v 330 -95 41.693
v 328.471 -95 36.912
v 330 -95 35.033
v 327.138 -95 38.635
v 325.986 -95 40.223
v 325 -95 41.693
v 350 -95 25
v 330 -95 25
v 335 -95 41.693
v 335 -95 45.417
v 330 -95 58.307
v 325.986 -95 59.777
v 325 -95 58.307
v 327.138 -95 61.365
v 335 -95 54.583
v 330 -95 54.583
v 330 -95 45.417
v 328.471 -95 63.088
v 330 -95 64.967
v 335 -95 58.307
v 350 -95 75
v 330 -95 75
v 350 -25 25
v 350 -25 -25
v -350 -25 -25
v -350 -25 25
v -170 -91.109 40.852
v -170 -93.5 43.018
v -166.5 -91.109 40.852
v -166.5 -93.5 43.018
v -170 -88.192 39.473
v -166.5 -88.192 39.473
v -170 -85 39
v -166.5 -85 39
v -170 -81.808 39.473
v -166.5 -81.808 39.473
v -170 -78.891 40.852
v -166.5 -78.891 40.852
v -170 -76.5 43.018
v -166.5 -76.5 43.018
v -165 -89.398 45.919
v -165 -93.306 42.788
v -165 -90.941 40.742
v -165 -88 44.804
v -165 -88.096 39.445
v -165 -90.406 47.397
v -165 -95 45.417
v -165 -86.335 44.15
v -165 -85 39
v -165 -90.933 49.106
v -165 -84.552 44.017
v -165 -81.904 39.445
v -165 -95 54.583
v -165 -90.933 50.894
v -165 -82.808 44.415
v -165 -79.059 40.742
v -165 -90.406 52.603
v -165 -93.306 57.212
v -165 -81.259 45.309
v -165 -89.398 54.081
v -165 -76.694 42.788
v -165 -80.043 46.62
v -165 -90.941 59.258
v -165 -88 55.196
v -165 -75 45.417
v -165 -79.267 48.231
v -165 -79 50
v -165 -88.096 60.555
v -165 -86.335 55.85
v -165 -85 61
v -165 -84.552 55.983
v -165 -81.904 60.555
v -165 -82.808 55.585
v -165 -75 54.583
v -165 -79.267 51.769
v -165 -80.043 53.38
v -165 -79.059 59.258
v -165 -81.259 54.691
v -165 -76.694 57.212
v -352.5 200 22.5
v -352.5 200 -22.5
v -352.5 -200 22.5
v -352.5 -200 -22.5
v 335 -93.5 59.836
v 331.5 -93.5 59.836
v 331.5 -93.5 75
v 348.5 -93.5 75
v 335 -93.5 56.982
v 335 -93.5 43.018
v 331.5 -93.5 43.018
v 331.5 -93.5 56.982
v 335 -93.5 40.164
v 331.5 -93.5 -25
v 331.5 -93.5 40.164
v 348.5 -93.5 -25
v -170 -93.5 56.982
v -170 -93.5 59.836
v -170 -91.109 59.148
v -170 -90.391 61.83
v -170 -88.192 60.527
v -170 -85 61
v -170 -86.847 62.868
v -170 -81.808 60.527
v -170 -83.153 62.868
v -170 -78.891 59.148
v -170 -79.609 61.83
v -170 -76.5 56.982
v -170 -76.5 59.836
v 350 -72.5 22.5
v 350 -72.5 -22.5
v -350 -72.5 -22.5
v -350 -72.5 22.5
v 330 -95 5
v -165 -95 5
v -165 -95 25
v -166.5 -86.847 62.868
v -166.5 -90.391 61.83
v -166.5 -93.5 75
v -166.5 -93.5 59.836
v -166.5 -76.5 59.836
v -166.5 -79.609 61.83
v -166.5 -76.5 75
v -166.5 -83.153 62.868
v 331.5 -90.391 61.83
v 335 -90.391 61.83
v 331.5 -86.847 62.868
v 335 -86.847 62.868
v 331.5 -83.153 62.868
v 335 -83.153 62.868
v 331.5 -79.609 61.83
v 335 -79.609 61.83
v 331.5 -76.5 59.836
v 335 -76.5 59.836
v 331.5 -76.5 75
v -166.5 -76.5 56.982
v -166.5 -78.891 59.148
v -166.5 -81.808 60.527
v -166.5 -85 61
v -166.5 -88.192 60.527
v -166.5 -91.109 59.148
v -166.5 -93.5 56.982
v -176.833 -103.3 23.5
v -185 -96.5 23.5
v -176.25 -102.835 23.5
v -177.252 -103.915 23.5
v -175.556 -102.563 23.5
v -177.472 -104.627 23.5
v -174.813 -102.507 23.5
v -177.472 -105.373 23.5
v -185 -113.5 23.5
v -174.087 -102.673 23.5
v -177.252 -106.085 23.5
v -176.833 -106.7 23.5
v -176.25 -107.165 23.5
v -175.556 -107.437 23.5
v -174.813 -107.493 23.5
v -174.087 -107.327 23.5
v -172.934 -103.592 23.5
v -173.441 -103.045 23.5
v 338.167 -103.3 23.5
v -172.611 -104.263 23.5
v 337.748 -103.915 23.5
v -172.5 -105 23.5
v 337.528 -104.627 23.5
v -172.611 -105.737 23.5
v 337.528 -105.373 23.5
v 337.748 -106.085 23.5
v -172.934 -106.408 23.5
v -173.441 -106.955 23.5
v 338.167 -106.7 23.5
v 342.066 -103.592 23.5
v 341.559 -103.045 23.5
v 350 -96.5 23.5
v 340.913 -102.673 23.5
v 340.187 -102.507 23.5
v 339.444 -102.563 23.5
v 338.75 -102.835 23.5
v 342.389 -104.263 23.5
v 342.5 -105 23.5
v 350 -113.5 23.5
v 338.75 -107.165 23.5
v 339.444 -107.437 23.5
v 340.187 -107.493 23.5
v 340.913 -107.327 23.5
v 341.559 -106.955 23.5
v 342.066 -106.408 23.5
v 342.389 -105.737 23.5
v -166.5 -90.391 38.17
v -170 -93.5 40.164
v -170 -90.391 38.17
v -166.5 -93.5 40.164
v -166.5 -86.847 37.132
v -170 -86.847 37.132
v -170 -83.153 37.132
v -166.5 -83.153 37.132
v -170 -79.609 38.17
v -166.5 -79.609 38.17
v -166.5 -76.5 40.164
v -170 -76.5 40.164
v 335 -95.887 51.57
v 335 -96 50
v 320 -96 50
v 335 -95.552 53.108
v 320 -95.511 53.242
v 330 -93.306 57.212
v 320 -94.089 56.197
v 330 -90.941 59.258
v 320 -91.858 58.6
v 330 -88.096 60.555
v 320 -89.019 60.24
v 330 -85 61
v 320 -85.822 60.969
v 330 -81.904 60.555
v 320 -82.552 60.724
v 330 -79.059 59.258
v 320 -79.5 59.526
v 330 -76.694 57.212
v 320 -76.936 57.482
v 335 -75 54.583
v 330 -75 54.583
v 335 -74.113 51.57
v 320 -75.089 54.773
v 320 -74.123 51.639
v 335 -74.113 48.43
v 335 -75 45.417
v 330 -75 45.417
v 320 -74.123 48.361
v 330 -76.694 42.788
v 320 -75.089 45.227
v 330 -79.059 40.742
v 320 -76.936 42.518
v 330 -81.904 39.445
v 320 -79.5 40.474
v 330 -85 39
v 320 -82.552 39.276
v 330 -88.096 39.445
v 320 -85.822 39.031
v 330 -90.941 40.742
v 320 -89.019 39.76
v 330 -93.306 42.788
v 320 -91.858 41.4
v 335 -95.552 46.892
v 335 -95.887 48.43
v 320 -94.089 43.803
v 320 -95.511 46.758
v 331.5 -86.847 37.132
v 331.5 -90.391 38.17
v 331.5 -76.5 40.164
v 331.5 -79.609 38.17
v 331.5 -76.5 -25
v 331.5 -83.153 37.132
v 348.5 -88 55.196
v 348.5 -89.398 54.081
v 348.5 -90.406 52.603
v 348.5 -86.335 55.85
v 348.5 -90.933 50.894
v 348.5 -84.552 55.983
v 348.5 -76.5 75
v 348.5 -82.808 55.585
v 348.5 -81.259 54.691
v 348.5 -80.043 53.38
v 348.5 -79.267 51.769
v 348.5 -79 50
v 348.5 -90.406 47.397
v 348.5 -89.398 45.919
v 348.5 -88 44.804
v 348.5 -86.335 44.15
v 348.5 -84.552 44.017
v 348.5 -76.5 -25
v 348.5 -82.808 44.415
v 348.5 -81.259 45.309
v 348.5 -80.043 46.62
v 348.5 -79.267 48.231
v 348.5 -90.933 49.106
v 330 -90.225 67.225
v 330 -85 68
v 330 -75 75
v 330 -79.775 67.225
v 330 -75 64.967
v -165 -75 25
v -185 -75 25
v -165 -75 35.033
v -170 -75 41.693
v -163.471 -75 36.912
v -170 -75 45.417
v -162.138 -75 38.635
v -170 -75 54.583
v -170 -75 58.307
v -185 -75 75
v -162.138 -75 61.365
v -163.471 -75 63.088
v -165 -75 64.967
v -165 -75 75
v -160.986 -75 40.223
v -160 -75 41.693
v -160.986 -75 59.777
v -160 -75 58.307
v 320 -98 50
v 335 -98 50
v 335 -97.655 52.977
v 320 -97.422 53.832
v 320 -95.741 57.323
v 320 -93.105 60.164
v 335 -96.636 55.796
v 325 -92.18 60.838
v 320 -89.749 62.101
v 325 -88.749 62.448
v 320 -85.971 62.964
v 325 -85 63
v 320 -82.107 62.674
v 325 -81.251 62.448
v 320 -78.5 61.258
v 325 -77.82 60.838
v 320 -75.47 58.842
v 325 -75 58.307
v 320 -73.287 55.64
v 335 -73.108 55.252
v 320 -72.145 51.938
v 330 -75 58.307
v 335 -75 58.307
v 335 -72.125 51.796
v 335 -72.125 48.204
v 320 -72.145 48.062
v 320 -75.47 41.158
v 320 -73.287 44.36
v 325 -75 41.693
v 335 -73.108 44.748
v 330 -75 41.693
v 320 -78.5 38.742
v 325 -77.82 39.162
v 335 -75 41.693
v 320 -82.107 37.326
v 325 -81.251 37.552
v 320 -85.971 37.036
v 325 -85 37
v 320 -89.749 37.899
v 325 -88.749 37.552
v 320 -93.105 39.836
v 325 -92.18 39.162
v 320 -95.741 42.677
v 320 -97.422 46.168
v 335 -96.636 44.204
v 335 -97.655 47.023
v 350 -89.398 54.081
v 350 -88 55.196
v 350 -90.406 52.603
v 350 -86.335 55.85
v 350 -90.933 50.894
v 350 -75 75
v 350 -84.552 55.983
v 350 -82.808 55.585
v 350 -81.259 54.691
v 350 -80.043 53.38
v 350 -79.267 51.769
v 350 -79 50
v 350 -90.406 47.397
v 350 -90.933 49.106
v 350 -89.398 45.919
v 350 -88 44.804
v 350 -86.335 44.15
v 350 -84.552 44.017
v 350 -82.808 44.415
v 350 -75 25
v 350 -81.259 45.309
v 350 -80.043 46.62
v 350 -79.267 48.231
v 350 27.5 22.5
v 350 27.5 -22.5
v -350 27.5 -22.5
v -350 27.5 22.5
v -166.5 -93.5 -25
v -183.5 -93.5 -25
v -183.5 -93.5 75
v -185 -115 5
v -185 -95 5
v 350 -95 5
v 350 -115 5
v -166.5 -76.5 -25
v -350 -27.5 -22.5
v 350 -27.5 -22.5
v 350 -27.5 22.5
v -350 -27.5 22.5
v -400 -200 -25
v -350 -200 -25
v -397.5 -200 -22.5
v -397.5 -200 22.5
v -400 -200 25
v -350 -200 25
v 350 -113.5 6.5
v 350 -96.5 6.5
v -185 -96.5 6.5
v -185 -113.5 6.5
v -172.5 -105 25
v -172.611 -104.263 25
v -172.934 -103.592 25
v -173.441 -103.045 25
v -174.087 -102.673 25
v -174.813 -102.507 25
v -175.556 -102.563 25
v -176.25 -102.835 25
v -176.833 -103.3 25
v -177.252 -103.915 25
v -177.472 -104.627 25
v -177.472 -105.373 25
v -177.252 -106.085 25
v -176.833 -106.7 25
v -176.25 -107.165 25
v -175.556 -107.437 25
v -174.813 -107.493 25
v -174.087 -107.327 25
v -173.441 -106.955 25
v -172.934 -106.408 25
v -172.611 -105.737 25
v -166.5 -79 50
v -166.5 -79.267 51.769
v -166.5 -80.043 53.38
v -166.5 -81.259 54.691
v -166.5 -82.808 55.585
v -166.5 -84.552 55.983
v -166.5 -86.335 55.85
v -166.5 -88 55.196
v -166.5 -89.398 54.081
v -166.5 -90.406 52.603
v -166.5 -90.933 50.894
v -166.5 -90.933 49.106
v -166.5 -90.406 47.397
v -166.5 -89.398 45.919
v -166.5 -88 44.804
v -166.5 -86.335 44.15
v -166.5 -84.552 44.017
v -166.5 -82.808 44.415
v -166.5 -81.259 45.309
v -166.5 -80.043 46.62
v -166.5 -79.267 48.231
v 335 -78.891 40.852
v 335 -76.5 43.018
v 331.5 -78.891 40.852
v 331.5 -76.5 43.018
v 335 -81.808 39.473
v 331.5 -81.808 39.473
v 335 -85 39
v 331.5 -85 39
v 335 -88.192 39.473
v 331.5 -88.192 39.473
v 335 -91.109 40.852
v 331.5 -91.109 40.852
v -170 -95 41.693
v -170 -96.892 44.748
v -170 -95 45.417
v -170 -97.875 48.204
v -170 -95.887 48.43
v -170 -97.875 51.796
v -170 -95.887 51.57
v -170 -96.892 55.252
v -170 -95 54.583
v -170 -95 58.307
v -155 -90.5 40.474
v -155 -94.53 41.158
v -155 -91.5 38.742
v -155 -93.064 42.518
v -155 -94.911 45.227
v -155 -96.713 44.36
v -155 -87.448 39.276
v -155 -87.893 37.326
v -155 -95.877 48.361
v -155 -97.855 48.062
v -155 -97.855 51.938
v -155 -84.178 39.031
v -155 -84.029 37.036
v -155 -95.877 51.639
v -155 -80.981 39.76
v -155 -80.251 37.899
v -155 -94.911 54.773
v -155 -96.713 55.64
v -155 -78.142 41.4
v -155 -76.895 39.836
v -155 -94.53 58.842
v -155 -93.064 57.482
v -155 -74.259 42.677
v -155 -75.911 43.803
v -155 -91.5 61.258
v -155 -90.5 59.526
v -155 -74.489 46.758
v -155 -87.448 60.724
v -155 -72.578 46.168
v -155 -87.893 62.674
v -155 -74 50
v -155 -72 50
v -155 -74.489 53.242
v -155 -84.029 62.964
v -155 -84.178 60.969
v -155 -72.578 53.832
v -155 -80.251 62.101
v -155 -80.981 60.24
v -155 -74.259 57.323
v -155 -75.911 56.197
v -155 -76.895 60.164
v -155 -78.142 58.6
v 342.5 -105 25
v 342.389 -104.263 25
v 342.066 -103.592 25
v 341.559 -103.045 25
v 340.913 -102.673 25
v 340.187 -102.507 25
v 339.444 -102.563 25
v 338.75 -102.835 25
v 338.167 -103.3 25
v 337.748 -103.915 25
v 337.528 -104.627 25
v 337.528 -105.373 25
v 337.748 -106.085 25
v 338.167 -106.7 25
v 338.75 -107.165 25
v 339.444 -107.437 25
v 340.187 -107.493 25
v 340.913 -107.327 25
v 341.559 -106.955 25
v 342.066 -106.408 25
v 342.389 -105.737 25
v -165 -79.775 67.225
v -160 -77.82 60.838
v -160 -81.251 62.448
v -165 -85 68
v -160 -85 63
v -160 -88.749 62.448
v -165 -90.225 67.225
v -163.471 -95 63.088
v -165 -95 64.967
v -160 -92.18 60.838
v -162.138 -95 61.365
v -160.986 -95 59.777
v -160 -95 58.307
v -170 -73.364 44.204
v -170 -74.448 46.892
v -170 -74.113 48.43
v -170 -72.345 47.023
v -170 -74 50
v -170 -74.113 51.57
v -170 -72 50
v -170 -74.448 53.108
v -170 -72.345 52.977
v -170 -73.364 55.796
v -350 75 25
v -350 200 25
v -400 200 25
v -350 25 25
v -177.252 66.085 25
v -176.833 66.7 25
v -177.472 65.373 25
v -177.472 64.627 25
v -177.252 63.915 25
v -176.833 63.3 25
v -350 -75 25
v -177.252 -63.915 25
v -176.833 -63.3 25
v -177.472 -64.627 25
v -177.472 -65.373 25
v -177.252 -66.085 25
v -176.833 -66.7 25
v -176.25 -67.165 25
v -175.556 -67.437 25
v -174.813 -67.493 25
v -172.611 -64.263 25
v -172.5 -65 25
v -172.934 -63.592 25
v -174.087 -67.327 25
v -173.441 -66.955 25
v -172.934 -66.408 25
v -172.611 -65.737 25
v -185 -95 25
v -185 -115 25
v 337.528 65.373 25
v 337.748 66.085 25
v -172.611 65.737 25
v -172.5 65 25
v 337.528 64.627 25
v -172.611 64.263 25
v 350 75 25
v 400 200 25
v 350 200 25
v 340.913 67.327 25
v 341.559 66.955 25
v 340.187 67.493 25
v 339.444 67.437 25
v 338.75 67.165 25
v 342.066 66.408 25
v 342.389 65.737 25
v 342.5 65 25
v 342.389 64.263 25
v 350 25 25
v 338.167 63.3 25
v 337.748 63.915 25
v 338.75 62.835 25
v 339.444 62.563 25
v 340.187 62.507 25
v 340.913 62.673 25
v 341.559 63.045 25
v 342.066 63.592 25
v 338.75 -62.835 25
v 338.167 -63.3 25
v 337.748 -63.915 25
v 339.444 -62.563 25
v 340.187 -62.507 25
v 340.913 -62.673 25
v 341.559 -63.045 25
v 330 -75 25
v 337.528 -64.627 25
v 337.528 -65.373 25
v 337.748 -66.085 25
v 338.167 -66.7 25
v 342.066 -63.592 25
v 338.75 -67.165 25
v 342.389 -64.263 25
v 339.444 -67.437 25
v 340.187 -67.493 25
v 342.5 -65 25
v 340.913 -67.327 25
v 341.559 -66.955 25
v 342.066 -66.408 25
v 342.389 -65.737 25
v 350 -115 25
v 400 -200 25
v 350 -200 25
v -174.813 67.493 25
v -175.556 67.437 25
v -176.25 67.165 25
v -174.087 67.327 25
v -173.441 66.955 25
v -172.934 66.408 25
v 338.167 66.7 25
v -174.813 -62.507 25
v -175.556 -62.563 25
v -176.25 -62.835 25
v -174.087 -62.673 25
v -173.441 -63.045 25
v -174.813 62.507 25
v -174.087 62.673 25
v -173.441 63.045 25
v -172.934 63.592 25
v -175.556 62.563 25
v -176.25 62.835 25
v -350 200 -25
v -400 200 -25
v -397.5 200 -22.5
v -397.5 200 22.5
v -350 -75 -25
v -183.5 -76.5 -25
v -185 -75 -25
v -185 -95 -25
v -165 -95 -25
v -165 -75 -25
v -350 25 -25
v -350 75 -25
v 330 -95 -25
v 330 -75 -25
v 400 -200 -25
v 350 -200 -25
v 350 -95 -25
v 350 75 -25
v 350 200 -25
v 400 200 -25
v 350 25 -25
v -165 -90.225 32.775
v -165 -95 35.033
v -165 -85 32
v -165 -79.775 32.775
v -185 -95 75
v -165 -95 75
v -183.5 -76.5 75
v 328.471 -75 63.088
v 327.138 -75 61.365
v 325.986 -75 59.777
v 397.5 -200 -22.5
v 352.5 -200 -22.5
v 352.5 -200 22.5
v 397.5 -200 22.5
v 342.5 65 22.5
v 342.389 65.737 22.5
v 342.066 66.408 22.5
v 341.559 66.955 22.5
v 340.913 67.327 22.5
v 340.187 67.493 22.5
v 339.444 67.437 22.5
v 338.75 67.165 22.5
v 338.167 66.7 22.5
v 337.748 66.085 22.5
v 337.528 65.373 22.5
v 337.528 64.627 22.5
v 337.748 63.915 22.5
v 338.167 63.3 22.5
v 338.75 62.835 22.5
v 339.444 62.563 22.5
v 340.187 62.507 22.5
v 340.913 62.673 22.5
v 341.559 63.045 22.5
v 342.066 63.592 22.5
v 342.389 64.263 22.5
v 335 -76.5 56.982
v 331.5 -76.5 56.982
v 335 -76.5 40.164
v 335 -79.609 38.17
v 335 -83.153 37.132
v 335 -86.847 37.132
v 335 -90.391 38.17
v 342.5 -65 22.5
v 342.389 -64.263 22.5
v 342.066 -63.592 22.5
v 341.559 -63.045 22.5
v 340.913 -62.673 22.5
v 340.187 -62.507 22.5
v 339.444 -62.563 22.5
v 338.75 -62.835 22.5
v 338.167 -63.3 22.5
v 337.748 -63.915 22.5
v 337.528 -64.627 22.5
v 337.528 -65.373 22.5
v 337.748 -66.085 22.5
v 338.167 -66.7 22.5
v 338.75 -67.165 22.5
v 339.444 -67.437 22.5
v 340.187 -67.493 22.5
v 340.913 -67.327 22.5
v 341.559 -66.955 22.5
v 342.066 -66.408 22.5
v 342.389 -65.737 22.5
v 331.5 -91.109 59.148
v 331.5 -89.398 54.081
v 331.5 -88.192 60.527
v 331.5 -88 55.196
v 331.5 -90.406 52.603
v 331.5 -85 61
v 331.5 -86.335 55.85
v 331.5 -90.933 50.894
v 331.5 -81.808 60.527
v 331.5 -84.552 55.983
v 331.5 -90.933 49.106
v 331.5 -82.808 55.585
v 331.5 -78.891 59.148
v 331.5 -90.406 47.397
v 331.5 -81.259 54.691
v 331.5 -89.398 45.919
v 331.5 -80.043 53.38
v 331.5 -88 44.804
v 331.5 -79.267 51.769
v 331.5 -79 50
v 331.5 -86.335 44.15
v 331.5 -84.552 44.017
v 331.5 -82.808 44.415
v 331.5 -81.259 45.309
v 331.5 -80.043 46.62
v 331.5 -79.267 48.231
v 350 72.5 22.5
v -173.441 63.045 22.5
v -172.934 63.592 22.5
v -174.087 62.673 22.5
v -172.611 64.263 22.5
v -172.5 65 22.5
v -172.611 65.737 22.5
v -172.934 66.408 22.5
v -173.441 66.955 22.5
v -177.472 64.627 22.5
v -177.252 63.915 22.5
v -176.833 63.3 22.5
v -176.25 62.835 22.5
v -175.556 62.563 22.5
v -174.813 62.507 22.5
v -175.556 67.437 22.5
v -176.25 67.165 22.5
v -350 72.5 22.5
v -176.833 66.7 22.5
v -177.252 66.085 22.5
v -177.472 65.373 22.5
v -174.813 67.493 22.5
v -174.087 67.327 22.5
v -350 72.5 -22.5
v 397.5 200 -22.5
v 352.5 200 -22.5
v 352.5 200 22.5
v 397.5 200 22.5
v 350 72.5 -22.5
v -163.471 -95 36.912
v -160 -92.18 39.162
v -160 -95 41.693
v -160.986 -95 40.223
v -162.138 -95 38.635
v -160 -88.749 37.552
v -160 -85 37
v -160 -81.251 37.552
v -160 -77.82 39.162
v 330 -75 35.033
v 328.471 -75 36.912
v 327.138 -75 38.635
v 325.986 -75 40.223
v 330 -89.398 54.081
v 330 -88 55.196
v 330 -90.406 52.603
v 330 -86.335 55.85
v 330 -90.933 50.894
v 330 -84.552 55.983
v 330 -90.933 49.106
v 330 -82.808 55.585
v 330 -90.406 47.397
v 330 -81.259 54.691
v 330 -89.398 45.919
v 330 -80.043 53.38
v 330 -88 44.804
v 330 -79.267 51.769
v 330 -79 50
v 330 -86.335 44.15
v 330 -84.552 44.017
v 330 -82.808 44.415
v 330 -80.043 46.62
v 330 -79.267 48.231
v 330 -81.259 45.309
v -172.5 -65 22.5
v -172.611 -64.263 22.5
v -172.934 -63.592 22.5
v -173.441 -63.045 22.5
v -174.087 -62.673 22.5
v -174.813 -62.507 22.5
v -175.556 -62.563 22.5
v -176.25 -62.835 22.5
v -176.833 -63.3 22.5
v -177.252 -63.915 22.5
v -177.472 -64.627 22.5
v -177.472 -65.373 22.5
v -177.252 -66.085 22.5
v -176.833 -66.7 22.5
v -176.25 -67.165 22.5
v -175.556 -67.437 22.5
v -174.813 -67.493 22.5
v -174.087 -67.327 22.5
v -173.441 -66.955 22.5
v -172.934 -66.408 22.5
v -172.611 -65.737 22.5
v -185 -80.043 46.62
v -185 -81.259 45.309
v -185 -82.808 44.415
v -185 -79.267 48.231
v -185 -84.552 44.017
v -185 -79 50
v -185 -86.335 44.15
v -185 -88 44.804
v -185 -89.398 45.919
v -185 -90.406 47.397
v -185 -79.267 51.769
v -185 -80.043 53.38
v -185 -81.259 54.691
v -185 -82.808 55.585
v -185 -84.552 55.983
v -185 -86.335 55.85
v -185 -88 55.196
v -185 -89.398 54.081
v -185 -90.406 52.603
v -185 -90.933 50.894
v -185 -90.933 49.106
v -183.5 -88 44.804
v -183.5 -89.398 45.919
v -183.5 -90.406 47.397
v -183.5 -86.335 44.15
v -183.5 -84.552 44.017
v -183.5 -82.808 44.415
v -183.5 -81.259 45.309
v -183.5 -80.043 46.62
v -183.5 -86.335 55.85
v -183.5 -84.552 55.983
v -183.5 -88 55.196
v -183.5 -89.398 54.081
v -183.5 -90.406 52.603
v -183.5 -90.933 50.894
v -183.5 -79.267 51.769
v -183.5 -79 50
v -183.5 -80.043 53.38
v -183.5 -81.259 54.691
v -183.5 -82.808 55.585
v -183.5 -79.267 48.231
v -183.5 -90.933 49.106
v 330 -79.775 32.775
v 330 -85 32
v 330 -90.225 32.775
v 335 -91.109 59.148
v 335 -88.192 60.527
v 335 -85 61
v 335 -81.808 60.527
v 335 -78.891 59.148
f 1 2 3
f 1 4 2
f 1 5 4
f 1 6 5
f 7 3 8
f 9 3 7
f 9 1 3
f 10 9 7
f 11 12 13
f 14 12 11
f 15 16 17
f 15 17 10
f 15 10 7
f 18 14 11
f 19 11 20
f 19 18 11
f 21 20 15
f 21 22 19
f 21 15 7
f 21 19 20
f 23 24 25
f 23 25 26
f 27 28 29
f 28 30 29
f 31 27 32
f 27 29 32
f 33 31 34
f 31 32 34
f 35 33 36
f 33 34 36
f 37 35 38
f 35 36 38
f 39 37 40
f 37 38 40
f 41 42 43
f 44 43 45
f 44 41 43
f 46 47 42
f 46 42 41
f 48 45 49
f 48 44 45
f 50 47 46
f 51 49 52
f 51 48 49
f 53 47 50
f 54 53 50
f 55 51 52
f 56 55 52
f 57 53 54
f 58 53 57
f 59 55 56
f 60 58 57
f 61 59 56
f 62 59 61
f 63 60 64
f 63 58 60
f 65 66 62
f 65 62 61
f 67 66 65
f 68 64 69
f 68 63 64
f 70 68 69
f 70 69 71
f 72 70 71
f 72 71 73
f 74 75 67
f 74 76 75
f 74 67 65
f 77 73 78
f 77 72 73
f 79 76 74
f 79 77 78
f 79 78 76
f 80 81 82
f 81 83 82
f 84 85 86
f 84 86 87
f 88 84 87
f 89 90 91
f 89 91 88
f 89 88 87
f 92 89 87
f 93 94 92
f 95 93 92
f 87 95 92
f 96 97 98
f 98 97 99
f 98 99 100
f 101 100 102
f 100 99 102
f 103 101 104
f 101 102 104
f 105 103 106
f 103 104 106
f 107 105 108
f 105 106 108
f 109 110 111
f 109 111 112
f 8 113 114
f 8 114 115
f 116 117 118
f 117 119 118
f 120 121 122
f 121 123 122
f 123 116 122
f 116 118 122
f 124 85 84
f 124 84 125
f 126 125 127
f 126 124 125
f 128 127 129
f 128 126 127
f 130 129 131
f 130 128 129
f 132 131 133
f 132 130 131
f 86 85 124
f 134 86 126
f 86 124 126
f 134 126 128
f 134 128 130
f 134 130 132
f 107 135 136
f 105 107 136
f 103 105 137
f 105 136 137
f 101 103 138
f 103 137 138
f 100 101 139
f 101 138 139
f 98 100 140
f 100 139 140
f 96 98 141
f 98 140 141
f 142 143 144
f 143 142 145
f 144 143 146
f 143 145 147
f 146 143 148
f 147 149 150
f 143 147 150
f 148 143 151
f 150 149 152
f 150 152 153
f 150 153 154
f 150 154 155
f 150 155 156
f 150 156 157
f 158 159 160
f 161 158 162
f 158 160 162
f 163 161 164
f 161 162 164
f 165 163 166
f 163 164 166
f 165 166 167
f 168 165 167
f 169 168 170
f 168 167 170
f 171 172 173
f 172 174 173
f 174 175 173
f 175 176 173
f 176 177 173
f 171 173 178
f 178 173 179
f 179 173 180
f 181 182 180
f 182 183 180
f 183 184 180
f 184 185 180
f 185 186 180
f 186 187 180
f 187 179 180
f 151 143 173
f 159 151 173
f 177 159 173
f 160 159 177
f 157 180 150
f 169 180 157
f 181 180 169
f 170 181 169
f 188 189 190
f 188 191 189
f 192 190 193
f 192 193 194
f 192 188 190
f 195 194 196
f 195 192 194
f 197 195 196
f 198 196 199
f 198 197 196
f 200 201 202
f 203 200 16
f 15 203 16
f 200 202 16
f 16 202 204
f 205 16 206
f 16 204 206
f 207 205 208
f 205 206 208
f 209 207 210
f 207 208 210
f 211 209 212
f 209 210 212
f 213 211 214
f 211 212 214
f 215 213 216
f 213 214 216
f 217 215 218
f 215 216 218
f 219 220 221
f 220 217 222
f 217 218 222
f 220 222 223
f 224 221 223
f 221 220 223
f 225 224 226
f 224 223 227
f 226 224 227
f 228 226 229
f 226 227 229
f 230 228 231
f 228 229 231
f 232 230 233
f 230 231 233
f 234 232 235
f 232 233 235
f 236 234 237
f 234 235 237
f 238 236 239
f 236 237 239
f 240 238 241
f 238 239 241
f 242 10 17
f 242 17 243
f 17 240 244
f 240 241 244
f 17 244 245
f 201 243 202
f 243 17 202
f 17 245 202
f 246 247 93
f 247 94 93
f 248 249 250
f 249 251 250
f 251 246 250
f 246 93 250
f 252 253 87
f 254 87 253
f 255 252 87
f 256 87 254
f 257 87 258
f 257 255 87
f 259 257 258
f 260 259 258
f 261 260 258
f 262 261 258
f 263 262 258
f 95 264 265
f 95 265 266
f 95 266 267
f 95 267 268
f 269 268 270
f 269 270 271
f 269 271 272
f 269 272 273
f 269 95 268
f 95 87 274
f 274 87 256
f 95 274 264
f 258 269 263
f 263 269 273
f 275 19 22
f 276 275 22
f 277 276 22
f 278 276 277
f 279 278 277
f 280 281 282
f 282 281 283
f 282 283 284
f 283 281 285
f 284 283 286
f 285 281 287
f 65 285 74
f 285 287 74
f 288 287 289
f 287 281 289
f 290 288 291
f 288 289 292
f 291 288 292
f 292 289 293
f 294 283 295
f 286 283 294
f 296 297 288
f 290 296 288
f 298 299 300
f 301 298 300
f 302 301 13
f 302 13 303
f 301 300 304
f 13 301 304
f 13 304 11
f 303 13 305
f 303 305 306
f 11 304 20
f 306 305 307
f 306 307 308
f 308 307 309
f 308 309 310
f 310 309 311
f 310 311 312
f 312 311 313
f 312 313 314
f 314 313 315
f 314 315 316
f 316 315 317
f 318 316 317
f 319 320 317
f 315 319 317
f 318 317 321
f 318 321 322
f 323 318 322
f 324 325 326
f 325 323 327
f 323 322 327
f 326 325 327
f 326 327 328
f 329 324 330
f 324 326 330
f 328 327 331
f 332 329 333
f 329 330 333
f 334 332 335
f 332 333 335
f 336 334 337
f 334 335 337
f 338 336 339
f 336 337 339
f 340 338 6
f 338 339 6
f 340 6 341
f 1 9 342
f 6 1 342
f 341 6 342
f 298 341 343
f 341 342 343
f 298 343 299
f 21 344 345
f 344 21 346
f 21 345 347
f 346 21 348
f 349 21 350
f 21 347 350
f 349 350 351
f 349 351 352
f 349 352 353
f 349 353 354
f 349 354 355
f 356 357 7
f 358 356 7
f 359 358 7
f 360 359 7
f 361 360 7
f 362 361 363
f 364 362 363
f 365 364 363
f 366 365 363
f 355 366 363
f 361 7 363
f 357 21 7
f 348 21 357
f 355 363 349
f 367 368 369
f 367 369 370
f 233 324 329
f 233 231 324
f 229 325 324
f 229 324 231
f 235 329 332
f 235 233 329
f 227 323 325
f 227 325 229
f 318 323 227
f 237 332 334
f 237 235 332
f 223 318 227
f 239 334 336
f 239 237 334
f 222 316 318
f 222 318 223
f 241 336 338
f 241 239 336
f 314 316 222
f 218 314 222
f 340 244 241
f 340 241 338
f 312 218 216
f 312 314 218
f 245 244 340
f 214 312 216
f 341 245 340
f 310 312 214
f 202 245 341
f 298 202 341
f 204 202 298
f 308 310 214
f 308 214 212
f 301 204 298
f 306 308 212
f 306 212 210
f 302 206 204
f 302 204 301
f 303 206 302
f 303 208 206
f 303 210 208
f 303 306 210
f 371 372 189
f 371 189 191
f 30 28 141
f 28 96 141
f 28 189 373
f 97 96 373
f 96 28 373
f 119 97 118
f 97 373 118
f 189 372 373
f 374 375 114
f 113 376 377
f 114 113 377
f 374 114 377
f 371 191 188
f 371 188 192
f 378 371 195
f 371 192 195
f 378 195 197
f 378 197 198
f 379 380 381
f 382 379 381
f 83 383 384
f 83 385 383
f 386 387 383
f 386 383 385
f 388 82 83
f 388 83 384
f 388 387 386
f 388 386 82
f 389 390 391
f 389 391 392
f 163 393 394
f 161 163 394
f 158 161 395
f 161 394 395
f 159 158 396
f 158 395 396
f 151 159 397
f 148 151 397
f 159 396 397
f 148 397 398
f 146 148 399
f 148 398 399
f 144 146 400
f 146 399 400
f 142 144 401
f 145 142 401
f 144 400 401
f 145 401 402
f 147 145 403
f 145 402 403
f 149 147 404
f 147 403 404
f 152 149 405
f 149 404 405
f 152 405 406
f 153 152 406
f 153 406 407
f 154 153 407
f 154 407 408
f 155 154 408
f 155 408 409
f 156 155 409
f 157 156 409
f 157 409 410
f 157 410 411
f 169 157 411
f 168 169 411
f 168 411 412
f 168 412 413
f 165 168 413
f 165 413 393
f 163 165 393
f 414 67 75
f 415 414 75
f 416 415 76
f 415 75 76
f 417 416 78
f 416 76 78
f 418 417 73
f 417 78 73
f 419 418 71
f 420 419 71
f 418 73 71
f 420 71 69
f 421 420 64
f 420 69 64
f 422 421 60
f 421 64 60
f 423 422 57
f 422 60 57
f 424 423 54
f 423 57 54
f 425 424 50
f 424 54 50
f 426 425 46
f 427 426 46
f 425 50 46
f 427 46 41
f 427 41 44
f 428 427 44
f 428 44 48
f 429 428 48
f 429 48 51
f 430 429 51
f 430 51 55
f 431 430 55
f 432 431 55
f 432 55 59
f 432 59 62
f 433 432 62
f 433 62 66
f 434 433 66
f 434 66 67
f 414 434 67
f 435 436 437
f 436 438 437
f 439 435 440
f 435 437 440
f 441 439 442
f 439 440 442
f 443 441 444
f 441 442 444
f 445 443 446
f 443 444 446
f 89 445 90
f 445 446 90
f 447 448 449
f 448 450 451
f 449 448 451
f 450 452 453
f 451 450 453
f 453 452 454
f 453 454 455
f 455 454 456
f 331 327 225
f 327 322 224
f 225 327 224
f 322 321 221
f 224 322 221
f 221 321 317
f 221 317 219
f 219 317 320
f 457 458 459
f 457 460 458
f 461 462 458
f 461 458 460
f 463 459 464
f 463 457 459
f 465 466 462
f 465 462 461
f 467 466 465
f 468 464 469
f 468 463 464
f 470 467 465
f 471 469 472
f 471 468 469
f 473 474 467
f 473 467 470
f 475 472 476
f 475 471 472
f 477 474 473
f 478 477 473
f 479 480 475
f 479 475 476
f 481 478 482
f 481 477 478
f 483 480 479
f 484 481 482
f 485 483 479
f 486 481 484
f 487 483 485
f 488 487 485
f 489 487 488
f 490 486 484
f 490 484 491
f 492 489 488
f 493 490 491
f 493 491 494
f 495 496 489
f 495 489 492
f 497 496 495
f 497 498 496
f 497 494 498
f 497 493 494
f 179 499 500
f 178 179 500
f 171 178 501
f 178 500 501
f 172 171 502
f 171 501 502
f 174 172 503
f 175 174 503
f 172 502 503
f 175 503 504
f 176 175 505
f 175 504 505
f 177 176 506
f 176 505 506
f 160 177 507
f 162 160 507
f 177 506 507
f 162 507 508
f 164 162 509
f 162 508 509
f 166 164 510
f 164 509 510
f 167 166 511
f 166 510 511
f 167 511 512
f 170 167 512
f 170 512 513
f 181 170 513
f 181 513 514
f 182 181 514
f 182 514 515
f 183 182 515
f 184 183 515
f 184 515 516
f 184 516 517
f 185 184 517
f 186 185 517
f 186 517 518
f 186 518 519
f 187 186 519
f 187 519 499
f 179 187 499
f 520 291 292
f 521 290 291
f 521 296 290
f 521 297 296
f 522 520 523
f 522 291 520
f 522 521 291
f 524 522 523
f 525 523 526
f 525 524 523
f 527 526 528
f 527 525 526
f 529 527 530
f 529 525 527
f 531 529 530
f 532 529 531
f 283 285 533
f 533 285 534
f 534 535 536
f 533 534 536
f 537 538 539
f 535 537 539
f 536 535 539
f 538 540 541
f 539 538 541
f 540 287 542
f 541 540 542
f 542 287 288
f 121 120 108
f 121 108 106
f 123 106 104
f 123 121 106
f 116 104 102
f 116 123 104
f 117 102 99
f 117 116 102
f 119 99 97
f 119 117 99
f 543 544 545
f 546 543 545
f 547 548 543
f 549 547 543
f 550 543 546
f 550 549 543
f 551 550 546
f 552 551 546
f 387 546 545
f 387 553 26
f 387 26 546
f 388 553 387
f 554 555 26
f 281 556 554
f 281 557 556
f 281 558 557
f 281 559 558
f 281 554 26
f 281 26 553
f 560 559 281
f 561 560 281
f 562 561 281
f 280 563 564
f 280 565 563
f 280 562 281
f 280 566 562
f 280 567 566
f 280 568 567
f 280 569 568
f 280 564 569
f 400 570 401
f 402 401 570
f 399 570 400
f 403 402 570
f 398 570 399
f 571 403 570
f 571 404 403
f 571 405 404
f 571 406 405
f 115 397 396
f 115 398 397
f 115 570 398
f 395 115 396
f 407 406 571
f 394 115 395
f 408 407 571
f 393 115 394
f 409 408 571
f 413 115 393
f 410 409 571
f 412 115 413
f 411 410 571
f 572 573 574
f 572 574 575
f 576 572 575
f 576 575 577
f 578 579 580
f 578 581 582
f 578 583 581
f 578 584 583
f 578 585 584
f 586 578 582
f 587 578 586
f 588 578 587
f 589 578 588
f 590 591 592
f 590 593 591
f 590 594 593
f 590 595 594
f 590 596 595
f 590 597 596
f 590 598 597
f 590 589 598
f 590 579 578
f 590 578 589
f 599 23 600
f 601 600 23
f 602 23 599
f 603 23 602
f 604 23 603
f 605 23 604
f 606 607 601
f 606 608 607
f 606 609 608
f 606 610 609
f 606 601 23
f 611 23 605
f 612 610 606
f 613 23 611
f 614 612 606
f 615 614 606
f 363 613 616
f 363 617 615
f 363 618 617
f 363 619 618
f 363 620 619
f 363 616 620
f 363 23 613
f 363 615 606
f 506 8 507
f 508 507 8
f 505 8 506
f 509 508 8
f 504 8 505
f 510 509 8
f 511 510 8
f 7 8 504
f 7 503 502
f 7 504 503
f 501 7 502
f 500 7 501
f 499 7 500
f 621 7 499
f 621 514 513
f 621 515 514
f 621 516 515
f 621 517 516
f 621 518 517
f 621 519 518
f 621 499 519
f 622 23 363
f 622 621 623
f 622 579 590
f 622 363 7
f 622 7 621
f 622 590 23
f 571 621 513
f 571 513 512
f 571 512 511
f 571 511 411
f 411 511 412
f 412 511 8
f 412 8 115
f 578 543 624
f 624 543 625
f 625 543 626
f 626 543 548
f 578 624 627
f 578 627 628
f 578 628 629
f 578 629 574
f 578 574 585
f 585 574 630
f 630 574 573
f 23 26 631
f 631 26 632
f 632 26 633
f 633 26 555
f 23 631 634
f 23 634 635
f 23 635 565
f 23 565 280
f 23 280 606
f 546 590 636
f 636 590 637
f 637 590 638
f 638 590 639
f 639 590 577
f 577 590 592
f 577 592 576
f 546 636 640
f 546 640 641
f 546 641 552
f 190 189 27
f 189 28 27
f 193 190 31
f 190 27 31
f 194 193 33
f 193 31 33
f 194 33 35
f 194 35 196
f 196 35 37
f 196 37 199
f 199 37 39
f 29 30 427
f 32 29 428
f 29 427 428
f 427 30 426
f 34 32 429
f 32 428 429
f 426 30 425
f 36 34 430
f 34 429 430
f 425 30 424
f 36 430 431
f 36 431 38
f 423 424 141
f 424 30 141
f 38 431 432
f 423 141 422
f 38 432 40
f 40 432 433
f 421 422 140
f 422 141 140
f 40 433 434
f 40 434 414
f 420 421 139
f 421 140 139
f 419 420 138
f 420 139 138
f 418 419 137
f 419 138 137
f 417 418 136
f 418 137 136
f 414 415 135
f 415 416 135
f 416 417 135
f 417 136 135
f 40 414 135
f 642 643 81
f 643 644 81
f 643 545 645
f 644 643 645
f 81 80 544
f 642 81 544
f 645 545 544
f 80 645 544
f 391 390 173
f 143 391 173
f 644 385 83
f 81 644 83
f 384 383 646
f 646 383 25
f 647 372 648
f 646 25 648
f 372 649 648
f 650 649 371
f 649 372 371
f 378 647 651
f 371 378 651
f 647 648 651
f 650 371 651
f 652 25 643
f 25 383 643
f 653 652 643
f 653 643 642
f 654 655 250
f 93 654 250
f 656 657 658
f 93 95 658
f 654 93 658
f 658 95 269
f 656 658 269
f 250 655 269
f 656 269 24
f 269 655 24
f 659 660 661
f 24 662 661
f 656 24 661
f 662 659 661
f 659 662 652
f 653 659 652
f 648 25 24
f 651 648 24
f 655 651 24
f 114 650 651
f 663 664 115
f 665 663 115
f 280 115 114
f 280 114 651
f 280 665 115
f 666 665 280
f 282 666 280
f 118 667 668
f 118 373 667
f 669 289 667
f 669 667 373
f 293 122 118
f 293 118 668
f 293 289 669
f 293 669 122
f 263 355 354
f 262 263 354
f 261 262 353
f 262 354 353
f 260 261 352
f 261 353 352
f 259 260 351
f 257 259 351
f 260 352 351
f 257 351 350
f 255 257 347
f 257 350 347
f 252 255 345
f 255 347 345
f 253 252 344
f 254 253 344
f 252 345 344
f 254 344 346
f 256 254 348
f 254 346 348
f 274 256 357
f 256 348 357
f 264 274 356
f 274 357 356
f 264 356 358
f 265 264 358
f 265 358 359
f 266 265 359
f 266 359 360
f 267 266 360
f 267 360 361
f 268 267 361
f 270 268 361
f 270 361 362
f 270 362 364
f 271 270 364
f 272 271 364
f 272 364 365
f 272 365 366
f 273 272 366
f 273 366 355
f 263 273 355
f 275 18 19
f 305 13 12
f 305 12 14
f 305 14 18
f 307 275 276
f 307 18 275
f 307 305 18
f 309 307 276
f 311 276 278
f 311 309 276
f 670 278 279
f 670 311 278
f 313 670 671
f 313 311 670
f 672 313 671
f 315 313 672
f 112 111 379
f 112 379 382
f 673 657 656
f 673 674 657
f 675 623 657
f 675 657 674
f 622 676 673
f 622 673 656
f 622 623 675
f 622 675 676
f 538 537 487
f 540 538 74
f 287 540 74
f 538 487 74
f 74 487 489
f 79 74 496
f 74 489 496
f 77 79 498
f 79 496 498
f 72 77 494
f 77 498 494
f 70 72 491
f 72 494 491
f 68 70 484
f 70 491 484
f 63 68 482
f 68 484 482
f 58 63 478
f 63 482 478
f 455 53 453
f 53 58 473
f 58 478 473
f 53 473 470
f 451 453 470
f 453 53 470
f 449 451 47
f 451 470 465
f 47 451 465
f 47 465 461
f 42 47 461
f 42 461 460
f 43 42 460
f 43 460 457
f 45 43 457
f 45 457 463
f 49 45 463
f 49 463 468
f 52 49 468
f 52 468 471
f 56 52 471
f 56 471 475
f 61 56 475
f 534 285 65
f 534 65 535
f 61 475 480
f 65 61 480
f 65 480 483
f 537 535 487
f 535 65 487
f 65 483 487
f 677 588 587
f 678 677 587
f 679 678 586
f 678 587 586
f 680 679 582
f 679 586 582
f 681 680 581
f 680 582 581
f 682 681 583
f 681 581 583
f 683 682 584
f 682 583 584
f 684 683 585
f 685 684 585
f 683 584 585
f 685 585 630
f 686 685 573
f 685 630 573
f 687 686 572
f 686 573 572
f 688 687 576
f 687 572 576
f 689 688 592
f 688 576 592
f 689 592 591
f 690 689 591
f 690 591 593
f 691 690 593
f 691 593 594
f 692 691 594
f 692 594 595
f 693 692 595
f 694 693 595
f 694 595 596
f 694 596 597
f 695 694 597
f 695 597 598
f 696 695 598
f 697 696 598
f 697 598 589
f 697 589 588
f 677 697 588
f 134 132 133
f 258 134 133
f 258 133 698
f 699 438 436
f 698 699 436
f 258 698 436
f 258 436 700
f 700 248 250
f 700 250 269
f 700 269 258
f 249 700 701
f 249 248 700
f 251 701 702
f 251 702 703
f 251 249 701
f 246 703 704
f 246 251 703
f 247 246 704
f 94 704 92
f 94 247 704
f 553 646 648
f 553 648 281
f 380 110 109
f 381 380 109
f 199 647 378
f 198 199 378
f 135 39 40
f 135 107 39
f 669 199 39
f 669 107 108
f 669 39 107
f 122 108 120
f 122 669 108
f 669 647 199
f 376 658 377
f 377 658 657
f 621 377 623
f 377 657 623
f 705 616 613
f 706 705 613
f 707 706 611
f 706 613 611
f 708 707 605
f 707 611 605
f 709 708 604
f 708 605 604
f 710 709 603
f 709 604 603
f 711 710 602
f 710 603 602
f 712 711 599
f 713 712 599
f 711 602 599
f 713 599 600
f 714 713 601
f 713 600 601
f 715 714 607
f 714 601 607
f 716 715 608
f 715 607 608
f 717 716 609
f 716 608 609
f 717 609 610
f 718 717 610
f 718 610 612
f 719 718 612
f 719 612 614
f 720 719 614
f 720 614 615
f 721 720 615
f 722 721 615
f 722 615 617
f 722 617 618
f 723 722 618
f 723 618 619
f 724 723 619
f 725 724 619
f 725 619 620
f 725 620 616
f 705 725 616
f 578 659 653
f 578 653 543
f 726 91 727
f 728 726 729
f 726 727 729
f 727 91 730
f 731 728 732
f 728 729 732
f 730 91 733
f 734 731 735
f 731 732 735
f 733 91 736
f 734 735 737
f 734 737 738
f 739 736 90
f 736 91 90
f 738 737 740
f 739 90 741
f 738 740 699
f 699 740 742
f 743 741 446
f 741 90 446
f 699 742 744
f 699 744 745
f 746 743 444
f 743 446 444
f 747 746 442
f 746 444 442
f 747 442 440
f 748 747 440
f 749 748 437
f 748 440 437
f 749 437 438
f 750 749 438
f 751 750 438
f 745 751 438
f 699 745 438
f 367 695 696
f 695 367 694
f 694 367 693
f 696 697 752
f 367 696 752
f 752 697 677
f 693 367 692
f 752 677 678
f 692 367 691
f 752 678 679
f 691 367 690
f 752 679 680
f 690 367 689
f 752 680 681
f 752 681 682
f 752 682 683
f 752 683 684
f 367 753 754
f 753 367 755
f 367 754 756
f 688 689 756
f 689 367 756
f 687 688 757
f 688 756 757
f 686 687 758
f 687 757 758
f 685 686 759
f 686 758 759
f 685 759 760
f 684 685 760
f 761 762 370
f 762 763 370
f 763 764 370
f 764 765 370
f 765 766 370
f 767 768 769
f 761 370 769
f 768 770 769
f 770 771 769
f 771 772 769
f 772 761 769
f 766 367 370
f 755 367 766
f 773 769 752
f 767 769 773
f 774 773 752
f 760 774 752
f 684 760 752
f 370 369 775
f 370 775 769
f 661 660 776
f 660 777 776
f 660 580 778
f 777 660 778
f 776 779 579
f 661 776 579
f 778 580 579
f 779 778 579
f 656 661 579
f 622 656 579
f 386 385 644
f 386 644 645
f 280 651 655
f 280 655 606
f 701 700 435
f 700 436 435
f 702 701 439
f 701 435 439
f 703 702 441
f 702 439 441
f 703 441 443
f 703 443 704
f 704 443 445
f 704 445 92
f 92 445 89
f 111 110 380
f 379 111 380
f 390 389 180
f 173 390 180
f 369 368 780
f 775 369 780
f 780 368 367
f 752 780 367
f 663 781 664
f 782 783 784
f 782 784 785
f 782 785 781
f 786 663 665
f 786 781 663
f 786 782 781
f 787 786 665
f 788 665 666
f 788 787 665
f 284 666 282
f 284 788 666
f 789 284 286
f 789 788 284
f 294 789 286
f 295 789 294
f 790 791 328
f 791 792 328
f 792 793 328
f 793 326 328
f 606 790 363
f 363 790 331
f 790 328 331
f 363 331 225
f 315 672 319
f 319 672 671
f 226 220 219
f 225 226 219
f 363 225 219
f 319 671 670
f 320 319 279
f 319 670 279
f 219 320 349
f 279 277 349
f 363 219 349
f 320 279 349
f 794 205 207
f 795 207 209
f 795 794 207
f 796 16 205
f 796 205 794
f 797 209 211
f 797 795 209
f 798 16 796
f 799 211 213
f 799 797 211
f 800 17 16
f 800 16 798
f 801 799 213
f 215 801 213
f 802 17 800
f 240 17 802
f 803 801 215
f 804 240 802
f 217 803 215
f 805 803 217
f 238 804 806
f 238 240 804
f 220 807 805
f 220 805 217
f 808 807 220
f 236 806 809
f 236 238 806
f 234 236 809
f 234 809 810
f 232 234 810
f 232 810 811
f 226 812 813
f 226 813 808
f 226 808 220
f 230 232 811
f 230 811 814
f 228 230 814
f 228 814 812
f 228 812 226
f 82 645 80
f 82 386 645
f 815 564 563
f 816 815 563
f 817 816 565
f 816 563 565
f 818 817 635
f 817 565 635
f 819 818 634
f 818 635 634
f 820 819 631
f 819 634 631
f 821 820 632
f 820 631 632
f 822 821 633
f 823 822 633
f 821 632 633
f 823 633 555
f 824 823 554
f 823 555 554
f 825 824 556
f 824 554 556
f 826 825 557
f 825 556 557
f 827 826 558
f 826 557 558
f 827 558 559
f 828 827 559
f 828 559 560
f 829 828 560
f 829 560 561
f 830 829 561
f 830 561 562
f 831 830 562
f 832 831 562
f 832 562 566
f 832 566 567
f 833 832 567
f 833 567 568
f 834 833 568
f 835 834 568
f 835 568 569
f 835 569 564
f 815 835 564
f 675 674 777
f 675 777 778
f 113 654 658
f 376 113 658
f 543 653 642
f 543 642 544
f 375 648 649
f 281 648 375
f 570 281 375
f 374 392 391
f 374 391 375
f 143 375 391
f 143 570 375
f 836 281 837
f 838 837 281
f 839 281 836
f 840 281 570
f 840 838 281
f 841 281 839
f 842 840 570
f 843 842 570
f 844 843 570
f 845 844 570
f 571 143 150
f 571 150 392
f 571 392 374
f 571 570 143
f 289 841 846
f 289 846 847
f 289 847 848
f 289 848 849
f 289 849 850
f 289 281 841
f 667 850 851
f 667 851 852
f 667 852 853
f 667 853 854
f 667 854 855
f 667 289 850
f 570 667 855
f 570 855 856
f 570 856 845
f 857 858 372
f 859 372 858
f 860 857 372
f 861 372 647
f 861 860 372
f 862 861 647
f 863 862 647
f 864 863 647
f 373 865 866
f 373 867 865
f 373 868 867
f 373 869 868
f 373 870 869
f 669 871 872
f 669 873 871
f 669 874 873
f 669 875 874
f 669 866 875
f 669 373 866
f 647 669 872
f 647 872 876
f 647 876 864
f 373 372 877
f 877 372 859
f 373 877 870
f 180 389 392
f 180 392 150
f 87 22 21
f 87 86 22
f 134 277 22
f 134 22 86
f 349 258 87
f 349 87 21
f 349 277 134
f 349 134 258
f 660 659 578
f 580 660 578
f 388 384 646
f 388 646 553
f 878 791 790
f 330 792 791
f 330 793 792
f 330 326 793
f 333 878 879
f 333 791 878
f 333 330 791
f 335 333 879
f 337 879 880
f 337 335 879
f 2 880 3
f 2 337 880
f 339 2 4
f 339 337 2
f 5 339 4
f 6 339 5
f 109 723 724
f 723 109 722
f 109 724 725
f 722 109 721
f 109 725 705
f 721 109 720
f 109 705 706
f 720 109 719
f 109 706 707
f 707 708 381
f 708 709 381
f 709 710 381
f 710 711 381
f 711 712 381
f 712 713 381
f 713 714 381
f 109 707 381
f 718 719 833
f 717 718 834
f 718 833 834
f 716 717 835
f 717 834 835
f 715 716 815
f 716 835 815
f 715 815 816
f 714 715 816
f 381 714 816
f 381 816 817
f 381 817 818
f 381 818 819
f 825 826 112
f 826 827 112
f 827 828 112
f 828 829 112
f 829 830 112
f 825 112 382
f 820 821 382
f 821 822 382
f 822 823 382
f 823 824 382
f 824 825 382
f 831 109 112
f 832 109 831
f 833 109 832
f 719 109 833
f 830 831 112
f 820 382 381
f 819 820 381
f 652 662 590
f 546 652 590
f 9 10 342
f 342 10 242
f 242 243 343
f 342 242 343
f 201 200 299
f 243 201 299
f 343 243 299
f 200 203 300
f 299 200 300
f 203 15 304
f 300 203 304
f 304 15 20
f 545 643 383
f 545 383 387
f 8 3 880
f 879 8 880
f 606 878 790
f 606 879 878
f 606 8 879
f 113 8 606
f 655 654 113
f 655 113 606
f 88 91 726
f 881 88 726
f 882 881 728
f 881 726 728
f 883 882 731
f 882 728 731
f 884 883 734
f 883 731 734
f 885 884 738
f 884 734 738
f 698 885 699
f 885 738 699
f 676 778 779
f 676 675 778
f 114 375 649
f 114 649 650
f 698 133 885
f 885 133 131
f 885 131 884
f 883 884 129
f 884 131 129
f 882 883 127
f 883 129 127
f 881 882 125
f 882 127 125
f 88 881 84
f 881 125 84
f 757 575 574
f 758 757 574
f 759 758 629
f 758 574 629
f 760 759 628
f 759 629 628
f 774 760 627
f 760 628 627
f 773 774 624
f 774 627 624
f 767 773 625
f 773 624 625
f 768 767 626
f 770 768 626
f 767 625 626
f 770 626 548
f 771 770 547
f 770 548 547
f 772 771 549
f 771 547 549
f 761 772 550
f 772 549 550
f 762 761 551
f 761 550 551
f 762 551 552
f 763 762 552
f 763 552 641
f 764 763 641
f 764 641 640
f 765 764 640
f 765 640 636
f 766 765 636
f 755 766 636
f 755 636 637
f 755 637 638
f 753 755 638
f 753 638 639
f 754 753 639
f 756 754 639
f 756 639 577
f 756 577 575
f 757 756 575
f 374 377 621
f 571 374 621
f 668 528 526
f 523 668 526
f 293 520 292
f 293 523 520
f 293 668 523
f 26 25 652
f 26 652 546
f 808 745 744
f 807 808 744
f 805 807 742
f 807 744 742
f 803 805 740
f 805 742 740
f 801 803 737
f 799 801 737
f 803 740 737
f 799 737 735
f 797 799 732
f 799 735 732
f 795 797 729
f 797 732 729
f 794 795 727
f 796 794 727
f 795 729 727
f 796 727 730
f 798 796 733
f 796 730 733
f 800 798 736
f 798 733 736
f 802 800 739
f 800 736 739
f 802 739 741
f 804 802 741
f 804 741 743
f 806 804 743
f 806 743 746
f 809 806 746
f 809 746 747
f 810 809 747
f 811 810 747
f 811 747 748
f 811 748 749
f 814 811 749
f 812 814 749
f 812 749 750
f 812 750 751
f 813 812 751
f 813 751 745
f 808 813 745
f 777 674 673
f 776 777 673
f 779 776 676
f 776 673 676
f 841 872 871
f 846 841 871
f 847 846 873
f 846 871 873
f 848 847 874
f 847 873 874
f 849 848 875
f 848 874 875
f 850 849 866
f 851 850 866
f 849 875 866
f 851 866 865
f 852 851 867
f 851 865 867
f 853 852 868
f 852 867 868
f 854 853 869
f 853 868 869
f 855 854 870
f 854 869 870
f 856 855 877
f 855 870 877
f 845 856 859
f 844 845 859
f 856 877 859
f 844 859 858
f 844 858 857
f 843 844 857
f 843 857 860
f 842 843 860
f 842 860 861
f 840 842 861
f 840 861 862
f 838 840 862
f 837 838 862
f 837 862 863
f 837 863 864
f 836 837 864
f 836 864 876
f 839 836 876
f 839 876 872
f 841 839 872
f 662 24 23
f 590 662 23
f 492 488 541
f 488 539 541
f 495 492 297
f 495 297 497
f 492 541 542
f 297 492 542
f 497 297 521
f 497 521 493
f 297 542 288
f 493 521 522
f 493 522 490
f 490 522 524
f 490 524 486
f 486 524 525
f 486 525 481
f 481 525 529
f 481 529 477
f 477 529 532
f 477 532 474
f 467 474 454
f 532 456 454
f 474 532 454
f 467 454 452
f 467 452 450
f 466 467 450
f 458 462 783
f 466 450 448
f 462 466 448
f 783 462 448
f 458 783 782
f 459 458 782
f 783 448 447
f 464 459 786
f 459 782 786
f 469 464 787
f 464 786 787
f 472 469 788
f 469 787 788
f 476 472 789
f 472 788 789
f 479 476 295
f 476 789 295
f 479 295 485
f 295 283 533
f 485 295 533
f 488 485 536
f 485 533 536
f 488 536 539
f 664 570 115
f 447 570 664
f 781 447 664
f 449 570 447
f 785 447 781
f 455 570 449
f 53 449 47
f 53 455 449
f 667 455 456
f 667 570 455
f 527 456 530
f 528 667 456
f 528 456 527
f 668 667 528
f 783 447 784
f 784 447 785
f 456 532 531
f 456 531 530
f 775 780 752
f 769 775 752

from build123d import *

# Parameters (mm, degrees)
F0_W          = 50
F0_H          = 50
F0_W_2        = 45
F0_H_2        = 45
F1_DEPTH      = 200
F2_W          = 50
F2_H          = 50
F2_W_2        = 45
F2_H_2        = 45
F3_DEPTH      = 700
F4_W          = 20
F4_H          = 20
F4_W_2        = 17
F4_H_2        = 17
F5_DEPTH      = 50
F6_DEPTH      = 50
F7_W          = 20
F7_H          = 20
F7_W_2        = 17
F7_H_2        = 17
F8_DEPTH      = 535
F9_R          = 6
F10_DEPTH     = 750.001
F11_R         = 13
F11_R_2       = 11
F12_DEPTH     = 10
F13_DEPTH     = 5
F14_R         = 13
F14_R_2       = 11
F15_DEPTH     = 10
F16_DEPTH     = 5
F17_T4_ANGLE  = 213.9701071651
F17_T10_ANGLE = 213.9701071651
F17_T16_ANGLE = 213.9701071651
F17_T22_ANGLE = 213.9701071651
F18_R         = 2.5
F19_DEPTH     = 10


# Not quite as in the source:
# - a fillet or chamfer that OpenCascade refuses, or shapes differently, is made with other operations: its cross-section is extruded or revolved along the edge and cut away or added


with BuildPart() as f1:
    # F0 (on Front) → F1 (new body, symmetric)
    with BuildSketch(Plane.XZ):
        with Locations((-375, 0)):
            Rectangle(F0_W, F0_H)
        with Locations((-375, 0)):
            Rectangle(F0_W_2, F0_H_2, mode=Mode.SUBTRACT)
    extrude(amount=F1_DEPTH, both=True)



with BuildPart() as f1b:
    # F0 (on Front) → F1, piece 2 (new body, symmetric)
    with BuildSketch(Plane.XZ):
        with Locations((375, 0)):
            Rectangle(F0_W, F0_H)
        with Locations((375, 0)):
            Rectangle(F0_W_2, F0_H_2, mode=Mode.SUBTRACT)
    extrude(amount=F1_DEPTH, both=True)


with BuildPart() as f1_1:
    add(f1.part)

    add(f1b.part)  # F3 merges F1b
    # F2 (on face) → F3 (join, through all)
    with BuildSketch(Plane.YZ.offset(-350)):
        with Locations((50, 0)):
            Rectangle(F2_W, F2_H)
        with Locations((50, 0)):
            Rectangle(F2_W_2, F2_H_2, mode=Mode.SUBTRACT)
        with Locations((-50, 0)):
            Rectangle(F2_W, F2_H)
        with Locations((-50, 0)):
            Rectangle(F2_W_2, F2_H_2, mode=Mode.SUBTRACT)
    extrude(amount=F3_DEPTH)

    # F4 (on face) → F5 (join)
    with BuildSketch(Plane.XY.offset(25)):
        with Locations((340, -85)):
            Rectangle(F4_W, F4_H)
        with Locations((340, -85)):
            Rectangle(F4_W_2, F4_H_2, mode=Mode.SUBTRACT)
        with Locations((-175, -85)):
            Rectangle(F4_W, F4_H)
        with Locations((-175, -85)):
            Rectangle(F4_W_2, F4_H_2, mode=Mode.SUBTRACT)
    extrude(amount=-F5_DEPTH)

    # F4 (on face) → F6 (join)
    with BuildSketch(Plane.XY.offset(25)):
        with Locations((340, -85)):
            Rectangle(F4_W, F4_H)
        with Locations((340, -85)):
            Rectangle(F4_W_2, F4_H_2, mode=Mode.SUBTRACT)
        with Locations((-175, -85)):
            Rectangle(F4_W, F4_H)
        with Locations((-175, -85)):
            Rectangle(F4_W_2, F4_H_2, mode=Mode.SUBTRACT)
    extrude(amount=F6_DEPTH)

    # F7 (on face) → F8 (join)
    with BuildSketch(Plane(origin=(350, 0, 0), x_dir=(0, -1, 0), z_dir=(-1, 0, 0))):
        with Locations((105, 15)):
            Rectangle(F7_W, F7_H)
        with Locations((105, 15)):
            Rectangle(F7_W_2, F7_H_2, mode=Mode.SUBTRACT)
    extrude(amount=F8_DEPTH)

    # F9 (on face) → F10 (cut, through all)
    with BuildSketch(Plane.YZ.offset(350)):
        with Locations((-85, 50)):
            Circle(F9_R)
    extrude(amount=-F10_DEPTH, mode=Mode.SUBTRACT)

    # F11 (on face) → F12 (join)
    with BuildSketch(Plane(origin=(330, 0, 0), x_dir=(0, -1, 0), z_dir=(-1, 0, 0))):
        with Locations((85, 50)):
            Circle(F11_R)
        with Locations((85, 50)):
            Circle(F11_R_2, mode=Mode.SUBTRACT)
    extrude(amount=F12_DEPTH)

    # F11 (on face) → F13 (join)
    with BuildSketch(Plane(origin=(330, 0, 0), x_dir=(0, -1, 0), z_dir=(-1, 0, 0))):
        with Locations((85, 50)):
            Circle(F11_R)
        with Locations((85, 50)):
            Circle(F11_R_2, mode=Mode.SUBTRACT)
    extrude(amount=-F13_DEPTH)

    # F14 (on face) → F15 (join)
    with BuildSketch(Plane.YZ.offset(-165)):
        with Locations((-85, 50)):
            Circle(F14_R)
        with Locations((-85, 50)):
            Circle(F14_R_2, mode=Mode.SUBTRACT)
    extrude(amount=F15_DEPTH)

    # F14 (on face) → F16 (join)
    with BuildSketch(Plane.YZ.offset(-165)):
        with Locations((-85, 50)):
            Circle(F14_R)
        with Locations((-85, 50)):
            Circle(F14_R_2, mode=Mode.SUBTRACT)
    extrude(amount=-F16_DEPTH)

    # F17: chamfer of 5 on 10 edges, made by hand


with BuildPart() as f17_tool2:
    # F17_s3 → F17_t4 (revolve)
    with BuildSketch(Plane(origin=(0, 6.7154986509, 21.9859176279), x_dir=(1, 0, 0), z_dir=(0, 0.2921222291, 0.9563809927))):
        Polygon((-165, -113.8984958377), (-160, -108.8984958377), (-165, -108.8984958377), align=None)
    revolve(axis=Axis((-165, -85, 50), (1, 0, 0)), revolution_arc=F17_T4_ANGLE)

    split(bisect_by=Plane.XZ.offset(75), keep=Keep.TOP)

    split(bisect_by=Plane.XZ.offset(95), keep=Keep.BOTTOM)


with BuildPart() as f1_2:
    add(f1_1.part)

    # F17_t1: union F17_tool2
    add(f17_tool2.part)


with BuildPart() as f17_tool8:
    # F17_s9 → F17_t10 (revolve)
    with BuildSketch(Plane(origin=(0, 6.7154986509, 21.9859176279), x_dir=(1, 0, 0), z_dir=(0, -0.2921222291, -0.9563809927))):
        Polygon((-165, 77.8984958377), (-160, 82.8984958377), (-165, 82.8984958377), align=None)
    revolve(axis=Axis((-165, -85, 50), (1, 0, 0)), revolution_arc=F17_T10_ANGLE)

    split(bisect_by=Plane.XZ.offset(75), keep=Keep.TOP)

    split(bisect_by=Plane.XZ.offset(95), keep=Keep.BOTTOM)


with BuildPart() as f1_3:
    add(f1_2.part)

    # F17_t7: union F17_tool8
    add(f17_tool8.part)


with BuildPart() as f17_tool14:
    # F17_s15 → F17_t16 (revolve)
    with BuildSketch(Plane(origin=(0, -21.2225160964, 69.4805426982), x_dir=(1, 0, 0), z_dir=(0, -0.2921222291, 0.9563809927))):
        Polygon((330, -48.686272927), (325, -53.686272927), (330, -53.686272927), align=None)
    revolve(axis=Axis((330, -85, 50), (-1, 0, 0)), revolution_arc=F17_T16_ANGLE)

    split(bisect_by=Plane.XZ.offset(75), keep=Keep.TOP)

    split(bisect_by=Plane.XZ.offset(95), keep=Keep.BOTTOM)


with BuildPart() as f1_4:
    add(f1_3.part)

    # F17_t13: union F17_tool14
    add(f17_tool14.part)


with BuildPart() as f17_tool20:
    # F17_s21 → F17_t22 (revolve)
    with BuildSketch(Plane(origin=(0, -21.2225160964, 69.4805426982), x_dir=(1, 0, 0), z_dir=(0, 0.2921222291, -0.9563809927))):
        Polygon((330, 84.686272927), (325, 79.686272927), (330, 79.686272927), align=None)
    revolve(axis=Axis((330, -85, 50), (-1, 0, 0)), revolution_arc=F17_T22_ANGLE)

    split(bisect_by=Plane.XZ.offset(75), keep=Keep.TOP)

    split(bisect_by=Plane.XZ.offset(95), keep=Keep.BOTTOM)


with BuildPart() as f1_5:
    add(f1_4.part)

    # F17_t19: union F17_tool20
    add(f17_tool20.part)

    # F18 (on face) → F19 (cut)
    with BuildSketch(Plane.XY.offset(25)):
        with Locations((-175, -65)):
            Circle(F18_R)
        with Locations((-175, 65)):
            Circle(F18_R)
        with Locations((-175, -105)):
            Circle(F18_R)
        with Locations((340, -105)):
            Circle(F18_R)
        with Locations((340, -65)):
            Circle(F18_R)
        with Locations((340, 65)):
            Circle(F18_R)
    extrude(amount=-F19_DEPTH, mode=Mode.SUBTRACT)


solid = f1_5.part
